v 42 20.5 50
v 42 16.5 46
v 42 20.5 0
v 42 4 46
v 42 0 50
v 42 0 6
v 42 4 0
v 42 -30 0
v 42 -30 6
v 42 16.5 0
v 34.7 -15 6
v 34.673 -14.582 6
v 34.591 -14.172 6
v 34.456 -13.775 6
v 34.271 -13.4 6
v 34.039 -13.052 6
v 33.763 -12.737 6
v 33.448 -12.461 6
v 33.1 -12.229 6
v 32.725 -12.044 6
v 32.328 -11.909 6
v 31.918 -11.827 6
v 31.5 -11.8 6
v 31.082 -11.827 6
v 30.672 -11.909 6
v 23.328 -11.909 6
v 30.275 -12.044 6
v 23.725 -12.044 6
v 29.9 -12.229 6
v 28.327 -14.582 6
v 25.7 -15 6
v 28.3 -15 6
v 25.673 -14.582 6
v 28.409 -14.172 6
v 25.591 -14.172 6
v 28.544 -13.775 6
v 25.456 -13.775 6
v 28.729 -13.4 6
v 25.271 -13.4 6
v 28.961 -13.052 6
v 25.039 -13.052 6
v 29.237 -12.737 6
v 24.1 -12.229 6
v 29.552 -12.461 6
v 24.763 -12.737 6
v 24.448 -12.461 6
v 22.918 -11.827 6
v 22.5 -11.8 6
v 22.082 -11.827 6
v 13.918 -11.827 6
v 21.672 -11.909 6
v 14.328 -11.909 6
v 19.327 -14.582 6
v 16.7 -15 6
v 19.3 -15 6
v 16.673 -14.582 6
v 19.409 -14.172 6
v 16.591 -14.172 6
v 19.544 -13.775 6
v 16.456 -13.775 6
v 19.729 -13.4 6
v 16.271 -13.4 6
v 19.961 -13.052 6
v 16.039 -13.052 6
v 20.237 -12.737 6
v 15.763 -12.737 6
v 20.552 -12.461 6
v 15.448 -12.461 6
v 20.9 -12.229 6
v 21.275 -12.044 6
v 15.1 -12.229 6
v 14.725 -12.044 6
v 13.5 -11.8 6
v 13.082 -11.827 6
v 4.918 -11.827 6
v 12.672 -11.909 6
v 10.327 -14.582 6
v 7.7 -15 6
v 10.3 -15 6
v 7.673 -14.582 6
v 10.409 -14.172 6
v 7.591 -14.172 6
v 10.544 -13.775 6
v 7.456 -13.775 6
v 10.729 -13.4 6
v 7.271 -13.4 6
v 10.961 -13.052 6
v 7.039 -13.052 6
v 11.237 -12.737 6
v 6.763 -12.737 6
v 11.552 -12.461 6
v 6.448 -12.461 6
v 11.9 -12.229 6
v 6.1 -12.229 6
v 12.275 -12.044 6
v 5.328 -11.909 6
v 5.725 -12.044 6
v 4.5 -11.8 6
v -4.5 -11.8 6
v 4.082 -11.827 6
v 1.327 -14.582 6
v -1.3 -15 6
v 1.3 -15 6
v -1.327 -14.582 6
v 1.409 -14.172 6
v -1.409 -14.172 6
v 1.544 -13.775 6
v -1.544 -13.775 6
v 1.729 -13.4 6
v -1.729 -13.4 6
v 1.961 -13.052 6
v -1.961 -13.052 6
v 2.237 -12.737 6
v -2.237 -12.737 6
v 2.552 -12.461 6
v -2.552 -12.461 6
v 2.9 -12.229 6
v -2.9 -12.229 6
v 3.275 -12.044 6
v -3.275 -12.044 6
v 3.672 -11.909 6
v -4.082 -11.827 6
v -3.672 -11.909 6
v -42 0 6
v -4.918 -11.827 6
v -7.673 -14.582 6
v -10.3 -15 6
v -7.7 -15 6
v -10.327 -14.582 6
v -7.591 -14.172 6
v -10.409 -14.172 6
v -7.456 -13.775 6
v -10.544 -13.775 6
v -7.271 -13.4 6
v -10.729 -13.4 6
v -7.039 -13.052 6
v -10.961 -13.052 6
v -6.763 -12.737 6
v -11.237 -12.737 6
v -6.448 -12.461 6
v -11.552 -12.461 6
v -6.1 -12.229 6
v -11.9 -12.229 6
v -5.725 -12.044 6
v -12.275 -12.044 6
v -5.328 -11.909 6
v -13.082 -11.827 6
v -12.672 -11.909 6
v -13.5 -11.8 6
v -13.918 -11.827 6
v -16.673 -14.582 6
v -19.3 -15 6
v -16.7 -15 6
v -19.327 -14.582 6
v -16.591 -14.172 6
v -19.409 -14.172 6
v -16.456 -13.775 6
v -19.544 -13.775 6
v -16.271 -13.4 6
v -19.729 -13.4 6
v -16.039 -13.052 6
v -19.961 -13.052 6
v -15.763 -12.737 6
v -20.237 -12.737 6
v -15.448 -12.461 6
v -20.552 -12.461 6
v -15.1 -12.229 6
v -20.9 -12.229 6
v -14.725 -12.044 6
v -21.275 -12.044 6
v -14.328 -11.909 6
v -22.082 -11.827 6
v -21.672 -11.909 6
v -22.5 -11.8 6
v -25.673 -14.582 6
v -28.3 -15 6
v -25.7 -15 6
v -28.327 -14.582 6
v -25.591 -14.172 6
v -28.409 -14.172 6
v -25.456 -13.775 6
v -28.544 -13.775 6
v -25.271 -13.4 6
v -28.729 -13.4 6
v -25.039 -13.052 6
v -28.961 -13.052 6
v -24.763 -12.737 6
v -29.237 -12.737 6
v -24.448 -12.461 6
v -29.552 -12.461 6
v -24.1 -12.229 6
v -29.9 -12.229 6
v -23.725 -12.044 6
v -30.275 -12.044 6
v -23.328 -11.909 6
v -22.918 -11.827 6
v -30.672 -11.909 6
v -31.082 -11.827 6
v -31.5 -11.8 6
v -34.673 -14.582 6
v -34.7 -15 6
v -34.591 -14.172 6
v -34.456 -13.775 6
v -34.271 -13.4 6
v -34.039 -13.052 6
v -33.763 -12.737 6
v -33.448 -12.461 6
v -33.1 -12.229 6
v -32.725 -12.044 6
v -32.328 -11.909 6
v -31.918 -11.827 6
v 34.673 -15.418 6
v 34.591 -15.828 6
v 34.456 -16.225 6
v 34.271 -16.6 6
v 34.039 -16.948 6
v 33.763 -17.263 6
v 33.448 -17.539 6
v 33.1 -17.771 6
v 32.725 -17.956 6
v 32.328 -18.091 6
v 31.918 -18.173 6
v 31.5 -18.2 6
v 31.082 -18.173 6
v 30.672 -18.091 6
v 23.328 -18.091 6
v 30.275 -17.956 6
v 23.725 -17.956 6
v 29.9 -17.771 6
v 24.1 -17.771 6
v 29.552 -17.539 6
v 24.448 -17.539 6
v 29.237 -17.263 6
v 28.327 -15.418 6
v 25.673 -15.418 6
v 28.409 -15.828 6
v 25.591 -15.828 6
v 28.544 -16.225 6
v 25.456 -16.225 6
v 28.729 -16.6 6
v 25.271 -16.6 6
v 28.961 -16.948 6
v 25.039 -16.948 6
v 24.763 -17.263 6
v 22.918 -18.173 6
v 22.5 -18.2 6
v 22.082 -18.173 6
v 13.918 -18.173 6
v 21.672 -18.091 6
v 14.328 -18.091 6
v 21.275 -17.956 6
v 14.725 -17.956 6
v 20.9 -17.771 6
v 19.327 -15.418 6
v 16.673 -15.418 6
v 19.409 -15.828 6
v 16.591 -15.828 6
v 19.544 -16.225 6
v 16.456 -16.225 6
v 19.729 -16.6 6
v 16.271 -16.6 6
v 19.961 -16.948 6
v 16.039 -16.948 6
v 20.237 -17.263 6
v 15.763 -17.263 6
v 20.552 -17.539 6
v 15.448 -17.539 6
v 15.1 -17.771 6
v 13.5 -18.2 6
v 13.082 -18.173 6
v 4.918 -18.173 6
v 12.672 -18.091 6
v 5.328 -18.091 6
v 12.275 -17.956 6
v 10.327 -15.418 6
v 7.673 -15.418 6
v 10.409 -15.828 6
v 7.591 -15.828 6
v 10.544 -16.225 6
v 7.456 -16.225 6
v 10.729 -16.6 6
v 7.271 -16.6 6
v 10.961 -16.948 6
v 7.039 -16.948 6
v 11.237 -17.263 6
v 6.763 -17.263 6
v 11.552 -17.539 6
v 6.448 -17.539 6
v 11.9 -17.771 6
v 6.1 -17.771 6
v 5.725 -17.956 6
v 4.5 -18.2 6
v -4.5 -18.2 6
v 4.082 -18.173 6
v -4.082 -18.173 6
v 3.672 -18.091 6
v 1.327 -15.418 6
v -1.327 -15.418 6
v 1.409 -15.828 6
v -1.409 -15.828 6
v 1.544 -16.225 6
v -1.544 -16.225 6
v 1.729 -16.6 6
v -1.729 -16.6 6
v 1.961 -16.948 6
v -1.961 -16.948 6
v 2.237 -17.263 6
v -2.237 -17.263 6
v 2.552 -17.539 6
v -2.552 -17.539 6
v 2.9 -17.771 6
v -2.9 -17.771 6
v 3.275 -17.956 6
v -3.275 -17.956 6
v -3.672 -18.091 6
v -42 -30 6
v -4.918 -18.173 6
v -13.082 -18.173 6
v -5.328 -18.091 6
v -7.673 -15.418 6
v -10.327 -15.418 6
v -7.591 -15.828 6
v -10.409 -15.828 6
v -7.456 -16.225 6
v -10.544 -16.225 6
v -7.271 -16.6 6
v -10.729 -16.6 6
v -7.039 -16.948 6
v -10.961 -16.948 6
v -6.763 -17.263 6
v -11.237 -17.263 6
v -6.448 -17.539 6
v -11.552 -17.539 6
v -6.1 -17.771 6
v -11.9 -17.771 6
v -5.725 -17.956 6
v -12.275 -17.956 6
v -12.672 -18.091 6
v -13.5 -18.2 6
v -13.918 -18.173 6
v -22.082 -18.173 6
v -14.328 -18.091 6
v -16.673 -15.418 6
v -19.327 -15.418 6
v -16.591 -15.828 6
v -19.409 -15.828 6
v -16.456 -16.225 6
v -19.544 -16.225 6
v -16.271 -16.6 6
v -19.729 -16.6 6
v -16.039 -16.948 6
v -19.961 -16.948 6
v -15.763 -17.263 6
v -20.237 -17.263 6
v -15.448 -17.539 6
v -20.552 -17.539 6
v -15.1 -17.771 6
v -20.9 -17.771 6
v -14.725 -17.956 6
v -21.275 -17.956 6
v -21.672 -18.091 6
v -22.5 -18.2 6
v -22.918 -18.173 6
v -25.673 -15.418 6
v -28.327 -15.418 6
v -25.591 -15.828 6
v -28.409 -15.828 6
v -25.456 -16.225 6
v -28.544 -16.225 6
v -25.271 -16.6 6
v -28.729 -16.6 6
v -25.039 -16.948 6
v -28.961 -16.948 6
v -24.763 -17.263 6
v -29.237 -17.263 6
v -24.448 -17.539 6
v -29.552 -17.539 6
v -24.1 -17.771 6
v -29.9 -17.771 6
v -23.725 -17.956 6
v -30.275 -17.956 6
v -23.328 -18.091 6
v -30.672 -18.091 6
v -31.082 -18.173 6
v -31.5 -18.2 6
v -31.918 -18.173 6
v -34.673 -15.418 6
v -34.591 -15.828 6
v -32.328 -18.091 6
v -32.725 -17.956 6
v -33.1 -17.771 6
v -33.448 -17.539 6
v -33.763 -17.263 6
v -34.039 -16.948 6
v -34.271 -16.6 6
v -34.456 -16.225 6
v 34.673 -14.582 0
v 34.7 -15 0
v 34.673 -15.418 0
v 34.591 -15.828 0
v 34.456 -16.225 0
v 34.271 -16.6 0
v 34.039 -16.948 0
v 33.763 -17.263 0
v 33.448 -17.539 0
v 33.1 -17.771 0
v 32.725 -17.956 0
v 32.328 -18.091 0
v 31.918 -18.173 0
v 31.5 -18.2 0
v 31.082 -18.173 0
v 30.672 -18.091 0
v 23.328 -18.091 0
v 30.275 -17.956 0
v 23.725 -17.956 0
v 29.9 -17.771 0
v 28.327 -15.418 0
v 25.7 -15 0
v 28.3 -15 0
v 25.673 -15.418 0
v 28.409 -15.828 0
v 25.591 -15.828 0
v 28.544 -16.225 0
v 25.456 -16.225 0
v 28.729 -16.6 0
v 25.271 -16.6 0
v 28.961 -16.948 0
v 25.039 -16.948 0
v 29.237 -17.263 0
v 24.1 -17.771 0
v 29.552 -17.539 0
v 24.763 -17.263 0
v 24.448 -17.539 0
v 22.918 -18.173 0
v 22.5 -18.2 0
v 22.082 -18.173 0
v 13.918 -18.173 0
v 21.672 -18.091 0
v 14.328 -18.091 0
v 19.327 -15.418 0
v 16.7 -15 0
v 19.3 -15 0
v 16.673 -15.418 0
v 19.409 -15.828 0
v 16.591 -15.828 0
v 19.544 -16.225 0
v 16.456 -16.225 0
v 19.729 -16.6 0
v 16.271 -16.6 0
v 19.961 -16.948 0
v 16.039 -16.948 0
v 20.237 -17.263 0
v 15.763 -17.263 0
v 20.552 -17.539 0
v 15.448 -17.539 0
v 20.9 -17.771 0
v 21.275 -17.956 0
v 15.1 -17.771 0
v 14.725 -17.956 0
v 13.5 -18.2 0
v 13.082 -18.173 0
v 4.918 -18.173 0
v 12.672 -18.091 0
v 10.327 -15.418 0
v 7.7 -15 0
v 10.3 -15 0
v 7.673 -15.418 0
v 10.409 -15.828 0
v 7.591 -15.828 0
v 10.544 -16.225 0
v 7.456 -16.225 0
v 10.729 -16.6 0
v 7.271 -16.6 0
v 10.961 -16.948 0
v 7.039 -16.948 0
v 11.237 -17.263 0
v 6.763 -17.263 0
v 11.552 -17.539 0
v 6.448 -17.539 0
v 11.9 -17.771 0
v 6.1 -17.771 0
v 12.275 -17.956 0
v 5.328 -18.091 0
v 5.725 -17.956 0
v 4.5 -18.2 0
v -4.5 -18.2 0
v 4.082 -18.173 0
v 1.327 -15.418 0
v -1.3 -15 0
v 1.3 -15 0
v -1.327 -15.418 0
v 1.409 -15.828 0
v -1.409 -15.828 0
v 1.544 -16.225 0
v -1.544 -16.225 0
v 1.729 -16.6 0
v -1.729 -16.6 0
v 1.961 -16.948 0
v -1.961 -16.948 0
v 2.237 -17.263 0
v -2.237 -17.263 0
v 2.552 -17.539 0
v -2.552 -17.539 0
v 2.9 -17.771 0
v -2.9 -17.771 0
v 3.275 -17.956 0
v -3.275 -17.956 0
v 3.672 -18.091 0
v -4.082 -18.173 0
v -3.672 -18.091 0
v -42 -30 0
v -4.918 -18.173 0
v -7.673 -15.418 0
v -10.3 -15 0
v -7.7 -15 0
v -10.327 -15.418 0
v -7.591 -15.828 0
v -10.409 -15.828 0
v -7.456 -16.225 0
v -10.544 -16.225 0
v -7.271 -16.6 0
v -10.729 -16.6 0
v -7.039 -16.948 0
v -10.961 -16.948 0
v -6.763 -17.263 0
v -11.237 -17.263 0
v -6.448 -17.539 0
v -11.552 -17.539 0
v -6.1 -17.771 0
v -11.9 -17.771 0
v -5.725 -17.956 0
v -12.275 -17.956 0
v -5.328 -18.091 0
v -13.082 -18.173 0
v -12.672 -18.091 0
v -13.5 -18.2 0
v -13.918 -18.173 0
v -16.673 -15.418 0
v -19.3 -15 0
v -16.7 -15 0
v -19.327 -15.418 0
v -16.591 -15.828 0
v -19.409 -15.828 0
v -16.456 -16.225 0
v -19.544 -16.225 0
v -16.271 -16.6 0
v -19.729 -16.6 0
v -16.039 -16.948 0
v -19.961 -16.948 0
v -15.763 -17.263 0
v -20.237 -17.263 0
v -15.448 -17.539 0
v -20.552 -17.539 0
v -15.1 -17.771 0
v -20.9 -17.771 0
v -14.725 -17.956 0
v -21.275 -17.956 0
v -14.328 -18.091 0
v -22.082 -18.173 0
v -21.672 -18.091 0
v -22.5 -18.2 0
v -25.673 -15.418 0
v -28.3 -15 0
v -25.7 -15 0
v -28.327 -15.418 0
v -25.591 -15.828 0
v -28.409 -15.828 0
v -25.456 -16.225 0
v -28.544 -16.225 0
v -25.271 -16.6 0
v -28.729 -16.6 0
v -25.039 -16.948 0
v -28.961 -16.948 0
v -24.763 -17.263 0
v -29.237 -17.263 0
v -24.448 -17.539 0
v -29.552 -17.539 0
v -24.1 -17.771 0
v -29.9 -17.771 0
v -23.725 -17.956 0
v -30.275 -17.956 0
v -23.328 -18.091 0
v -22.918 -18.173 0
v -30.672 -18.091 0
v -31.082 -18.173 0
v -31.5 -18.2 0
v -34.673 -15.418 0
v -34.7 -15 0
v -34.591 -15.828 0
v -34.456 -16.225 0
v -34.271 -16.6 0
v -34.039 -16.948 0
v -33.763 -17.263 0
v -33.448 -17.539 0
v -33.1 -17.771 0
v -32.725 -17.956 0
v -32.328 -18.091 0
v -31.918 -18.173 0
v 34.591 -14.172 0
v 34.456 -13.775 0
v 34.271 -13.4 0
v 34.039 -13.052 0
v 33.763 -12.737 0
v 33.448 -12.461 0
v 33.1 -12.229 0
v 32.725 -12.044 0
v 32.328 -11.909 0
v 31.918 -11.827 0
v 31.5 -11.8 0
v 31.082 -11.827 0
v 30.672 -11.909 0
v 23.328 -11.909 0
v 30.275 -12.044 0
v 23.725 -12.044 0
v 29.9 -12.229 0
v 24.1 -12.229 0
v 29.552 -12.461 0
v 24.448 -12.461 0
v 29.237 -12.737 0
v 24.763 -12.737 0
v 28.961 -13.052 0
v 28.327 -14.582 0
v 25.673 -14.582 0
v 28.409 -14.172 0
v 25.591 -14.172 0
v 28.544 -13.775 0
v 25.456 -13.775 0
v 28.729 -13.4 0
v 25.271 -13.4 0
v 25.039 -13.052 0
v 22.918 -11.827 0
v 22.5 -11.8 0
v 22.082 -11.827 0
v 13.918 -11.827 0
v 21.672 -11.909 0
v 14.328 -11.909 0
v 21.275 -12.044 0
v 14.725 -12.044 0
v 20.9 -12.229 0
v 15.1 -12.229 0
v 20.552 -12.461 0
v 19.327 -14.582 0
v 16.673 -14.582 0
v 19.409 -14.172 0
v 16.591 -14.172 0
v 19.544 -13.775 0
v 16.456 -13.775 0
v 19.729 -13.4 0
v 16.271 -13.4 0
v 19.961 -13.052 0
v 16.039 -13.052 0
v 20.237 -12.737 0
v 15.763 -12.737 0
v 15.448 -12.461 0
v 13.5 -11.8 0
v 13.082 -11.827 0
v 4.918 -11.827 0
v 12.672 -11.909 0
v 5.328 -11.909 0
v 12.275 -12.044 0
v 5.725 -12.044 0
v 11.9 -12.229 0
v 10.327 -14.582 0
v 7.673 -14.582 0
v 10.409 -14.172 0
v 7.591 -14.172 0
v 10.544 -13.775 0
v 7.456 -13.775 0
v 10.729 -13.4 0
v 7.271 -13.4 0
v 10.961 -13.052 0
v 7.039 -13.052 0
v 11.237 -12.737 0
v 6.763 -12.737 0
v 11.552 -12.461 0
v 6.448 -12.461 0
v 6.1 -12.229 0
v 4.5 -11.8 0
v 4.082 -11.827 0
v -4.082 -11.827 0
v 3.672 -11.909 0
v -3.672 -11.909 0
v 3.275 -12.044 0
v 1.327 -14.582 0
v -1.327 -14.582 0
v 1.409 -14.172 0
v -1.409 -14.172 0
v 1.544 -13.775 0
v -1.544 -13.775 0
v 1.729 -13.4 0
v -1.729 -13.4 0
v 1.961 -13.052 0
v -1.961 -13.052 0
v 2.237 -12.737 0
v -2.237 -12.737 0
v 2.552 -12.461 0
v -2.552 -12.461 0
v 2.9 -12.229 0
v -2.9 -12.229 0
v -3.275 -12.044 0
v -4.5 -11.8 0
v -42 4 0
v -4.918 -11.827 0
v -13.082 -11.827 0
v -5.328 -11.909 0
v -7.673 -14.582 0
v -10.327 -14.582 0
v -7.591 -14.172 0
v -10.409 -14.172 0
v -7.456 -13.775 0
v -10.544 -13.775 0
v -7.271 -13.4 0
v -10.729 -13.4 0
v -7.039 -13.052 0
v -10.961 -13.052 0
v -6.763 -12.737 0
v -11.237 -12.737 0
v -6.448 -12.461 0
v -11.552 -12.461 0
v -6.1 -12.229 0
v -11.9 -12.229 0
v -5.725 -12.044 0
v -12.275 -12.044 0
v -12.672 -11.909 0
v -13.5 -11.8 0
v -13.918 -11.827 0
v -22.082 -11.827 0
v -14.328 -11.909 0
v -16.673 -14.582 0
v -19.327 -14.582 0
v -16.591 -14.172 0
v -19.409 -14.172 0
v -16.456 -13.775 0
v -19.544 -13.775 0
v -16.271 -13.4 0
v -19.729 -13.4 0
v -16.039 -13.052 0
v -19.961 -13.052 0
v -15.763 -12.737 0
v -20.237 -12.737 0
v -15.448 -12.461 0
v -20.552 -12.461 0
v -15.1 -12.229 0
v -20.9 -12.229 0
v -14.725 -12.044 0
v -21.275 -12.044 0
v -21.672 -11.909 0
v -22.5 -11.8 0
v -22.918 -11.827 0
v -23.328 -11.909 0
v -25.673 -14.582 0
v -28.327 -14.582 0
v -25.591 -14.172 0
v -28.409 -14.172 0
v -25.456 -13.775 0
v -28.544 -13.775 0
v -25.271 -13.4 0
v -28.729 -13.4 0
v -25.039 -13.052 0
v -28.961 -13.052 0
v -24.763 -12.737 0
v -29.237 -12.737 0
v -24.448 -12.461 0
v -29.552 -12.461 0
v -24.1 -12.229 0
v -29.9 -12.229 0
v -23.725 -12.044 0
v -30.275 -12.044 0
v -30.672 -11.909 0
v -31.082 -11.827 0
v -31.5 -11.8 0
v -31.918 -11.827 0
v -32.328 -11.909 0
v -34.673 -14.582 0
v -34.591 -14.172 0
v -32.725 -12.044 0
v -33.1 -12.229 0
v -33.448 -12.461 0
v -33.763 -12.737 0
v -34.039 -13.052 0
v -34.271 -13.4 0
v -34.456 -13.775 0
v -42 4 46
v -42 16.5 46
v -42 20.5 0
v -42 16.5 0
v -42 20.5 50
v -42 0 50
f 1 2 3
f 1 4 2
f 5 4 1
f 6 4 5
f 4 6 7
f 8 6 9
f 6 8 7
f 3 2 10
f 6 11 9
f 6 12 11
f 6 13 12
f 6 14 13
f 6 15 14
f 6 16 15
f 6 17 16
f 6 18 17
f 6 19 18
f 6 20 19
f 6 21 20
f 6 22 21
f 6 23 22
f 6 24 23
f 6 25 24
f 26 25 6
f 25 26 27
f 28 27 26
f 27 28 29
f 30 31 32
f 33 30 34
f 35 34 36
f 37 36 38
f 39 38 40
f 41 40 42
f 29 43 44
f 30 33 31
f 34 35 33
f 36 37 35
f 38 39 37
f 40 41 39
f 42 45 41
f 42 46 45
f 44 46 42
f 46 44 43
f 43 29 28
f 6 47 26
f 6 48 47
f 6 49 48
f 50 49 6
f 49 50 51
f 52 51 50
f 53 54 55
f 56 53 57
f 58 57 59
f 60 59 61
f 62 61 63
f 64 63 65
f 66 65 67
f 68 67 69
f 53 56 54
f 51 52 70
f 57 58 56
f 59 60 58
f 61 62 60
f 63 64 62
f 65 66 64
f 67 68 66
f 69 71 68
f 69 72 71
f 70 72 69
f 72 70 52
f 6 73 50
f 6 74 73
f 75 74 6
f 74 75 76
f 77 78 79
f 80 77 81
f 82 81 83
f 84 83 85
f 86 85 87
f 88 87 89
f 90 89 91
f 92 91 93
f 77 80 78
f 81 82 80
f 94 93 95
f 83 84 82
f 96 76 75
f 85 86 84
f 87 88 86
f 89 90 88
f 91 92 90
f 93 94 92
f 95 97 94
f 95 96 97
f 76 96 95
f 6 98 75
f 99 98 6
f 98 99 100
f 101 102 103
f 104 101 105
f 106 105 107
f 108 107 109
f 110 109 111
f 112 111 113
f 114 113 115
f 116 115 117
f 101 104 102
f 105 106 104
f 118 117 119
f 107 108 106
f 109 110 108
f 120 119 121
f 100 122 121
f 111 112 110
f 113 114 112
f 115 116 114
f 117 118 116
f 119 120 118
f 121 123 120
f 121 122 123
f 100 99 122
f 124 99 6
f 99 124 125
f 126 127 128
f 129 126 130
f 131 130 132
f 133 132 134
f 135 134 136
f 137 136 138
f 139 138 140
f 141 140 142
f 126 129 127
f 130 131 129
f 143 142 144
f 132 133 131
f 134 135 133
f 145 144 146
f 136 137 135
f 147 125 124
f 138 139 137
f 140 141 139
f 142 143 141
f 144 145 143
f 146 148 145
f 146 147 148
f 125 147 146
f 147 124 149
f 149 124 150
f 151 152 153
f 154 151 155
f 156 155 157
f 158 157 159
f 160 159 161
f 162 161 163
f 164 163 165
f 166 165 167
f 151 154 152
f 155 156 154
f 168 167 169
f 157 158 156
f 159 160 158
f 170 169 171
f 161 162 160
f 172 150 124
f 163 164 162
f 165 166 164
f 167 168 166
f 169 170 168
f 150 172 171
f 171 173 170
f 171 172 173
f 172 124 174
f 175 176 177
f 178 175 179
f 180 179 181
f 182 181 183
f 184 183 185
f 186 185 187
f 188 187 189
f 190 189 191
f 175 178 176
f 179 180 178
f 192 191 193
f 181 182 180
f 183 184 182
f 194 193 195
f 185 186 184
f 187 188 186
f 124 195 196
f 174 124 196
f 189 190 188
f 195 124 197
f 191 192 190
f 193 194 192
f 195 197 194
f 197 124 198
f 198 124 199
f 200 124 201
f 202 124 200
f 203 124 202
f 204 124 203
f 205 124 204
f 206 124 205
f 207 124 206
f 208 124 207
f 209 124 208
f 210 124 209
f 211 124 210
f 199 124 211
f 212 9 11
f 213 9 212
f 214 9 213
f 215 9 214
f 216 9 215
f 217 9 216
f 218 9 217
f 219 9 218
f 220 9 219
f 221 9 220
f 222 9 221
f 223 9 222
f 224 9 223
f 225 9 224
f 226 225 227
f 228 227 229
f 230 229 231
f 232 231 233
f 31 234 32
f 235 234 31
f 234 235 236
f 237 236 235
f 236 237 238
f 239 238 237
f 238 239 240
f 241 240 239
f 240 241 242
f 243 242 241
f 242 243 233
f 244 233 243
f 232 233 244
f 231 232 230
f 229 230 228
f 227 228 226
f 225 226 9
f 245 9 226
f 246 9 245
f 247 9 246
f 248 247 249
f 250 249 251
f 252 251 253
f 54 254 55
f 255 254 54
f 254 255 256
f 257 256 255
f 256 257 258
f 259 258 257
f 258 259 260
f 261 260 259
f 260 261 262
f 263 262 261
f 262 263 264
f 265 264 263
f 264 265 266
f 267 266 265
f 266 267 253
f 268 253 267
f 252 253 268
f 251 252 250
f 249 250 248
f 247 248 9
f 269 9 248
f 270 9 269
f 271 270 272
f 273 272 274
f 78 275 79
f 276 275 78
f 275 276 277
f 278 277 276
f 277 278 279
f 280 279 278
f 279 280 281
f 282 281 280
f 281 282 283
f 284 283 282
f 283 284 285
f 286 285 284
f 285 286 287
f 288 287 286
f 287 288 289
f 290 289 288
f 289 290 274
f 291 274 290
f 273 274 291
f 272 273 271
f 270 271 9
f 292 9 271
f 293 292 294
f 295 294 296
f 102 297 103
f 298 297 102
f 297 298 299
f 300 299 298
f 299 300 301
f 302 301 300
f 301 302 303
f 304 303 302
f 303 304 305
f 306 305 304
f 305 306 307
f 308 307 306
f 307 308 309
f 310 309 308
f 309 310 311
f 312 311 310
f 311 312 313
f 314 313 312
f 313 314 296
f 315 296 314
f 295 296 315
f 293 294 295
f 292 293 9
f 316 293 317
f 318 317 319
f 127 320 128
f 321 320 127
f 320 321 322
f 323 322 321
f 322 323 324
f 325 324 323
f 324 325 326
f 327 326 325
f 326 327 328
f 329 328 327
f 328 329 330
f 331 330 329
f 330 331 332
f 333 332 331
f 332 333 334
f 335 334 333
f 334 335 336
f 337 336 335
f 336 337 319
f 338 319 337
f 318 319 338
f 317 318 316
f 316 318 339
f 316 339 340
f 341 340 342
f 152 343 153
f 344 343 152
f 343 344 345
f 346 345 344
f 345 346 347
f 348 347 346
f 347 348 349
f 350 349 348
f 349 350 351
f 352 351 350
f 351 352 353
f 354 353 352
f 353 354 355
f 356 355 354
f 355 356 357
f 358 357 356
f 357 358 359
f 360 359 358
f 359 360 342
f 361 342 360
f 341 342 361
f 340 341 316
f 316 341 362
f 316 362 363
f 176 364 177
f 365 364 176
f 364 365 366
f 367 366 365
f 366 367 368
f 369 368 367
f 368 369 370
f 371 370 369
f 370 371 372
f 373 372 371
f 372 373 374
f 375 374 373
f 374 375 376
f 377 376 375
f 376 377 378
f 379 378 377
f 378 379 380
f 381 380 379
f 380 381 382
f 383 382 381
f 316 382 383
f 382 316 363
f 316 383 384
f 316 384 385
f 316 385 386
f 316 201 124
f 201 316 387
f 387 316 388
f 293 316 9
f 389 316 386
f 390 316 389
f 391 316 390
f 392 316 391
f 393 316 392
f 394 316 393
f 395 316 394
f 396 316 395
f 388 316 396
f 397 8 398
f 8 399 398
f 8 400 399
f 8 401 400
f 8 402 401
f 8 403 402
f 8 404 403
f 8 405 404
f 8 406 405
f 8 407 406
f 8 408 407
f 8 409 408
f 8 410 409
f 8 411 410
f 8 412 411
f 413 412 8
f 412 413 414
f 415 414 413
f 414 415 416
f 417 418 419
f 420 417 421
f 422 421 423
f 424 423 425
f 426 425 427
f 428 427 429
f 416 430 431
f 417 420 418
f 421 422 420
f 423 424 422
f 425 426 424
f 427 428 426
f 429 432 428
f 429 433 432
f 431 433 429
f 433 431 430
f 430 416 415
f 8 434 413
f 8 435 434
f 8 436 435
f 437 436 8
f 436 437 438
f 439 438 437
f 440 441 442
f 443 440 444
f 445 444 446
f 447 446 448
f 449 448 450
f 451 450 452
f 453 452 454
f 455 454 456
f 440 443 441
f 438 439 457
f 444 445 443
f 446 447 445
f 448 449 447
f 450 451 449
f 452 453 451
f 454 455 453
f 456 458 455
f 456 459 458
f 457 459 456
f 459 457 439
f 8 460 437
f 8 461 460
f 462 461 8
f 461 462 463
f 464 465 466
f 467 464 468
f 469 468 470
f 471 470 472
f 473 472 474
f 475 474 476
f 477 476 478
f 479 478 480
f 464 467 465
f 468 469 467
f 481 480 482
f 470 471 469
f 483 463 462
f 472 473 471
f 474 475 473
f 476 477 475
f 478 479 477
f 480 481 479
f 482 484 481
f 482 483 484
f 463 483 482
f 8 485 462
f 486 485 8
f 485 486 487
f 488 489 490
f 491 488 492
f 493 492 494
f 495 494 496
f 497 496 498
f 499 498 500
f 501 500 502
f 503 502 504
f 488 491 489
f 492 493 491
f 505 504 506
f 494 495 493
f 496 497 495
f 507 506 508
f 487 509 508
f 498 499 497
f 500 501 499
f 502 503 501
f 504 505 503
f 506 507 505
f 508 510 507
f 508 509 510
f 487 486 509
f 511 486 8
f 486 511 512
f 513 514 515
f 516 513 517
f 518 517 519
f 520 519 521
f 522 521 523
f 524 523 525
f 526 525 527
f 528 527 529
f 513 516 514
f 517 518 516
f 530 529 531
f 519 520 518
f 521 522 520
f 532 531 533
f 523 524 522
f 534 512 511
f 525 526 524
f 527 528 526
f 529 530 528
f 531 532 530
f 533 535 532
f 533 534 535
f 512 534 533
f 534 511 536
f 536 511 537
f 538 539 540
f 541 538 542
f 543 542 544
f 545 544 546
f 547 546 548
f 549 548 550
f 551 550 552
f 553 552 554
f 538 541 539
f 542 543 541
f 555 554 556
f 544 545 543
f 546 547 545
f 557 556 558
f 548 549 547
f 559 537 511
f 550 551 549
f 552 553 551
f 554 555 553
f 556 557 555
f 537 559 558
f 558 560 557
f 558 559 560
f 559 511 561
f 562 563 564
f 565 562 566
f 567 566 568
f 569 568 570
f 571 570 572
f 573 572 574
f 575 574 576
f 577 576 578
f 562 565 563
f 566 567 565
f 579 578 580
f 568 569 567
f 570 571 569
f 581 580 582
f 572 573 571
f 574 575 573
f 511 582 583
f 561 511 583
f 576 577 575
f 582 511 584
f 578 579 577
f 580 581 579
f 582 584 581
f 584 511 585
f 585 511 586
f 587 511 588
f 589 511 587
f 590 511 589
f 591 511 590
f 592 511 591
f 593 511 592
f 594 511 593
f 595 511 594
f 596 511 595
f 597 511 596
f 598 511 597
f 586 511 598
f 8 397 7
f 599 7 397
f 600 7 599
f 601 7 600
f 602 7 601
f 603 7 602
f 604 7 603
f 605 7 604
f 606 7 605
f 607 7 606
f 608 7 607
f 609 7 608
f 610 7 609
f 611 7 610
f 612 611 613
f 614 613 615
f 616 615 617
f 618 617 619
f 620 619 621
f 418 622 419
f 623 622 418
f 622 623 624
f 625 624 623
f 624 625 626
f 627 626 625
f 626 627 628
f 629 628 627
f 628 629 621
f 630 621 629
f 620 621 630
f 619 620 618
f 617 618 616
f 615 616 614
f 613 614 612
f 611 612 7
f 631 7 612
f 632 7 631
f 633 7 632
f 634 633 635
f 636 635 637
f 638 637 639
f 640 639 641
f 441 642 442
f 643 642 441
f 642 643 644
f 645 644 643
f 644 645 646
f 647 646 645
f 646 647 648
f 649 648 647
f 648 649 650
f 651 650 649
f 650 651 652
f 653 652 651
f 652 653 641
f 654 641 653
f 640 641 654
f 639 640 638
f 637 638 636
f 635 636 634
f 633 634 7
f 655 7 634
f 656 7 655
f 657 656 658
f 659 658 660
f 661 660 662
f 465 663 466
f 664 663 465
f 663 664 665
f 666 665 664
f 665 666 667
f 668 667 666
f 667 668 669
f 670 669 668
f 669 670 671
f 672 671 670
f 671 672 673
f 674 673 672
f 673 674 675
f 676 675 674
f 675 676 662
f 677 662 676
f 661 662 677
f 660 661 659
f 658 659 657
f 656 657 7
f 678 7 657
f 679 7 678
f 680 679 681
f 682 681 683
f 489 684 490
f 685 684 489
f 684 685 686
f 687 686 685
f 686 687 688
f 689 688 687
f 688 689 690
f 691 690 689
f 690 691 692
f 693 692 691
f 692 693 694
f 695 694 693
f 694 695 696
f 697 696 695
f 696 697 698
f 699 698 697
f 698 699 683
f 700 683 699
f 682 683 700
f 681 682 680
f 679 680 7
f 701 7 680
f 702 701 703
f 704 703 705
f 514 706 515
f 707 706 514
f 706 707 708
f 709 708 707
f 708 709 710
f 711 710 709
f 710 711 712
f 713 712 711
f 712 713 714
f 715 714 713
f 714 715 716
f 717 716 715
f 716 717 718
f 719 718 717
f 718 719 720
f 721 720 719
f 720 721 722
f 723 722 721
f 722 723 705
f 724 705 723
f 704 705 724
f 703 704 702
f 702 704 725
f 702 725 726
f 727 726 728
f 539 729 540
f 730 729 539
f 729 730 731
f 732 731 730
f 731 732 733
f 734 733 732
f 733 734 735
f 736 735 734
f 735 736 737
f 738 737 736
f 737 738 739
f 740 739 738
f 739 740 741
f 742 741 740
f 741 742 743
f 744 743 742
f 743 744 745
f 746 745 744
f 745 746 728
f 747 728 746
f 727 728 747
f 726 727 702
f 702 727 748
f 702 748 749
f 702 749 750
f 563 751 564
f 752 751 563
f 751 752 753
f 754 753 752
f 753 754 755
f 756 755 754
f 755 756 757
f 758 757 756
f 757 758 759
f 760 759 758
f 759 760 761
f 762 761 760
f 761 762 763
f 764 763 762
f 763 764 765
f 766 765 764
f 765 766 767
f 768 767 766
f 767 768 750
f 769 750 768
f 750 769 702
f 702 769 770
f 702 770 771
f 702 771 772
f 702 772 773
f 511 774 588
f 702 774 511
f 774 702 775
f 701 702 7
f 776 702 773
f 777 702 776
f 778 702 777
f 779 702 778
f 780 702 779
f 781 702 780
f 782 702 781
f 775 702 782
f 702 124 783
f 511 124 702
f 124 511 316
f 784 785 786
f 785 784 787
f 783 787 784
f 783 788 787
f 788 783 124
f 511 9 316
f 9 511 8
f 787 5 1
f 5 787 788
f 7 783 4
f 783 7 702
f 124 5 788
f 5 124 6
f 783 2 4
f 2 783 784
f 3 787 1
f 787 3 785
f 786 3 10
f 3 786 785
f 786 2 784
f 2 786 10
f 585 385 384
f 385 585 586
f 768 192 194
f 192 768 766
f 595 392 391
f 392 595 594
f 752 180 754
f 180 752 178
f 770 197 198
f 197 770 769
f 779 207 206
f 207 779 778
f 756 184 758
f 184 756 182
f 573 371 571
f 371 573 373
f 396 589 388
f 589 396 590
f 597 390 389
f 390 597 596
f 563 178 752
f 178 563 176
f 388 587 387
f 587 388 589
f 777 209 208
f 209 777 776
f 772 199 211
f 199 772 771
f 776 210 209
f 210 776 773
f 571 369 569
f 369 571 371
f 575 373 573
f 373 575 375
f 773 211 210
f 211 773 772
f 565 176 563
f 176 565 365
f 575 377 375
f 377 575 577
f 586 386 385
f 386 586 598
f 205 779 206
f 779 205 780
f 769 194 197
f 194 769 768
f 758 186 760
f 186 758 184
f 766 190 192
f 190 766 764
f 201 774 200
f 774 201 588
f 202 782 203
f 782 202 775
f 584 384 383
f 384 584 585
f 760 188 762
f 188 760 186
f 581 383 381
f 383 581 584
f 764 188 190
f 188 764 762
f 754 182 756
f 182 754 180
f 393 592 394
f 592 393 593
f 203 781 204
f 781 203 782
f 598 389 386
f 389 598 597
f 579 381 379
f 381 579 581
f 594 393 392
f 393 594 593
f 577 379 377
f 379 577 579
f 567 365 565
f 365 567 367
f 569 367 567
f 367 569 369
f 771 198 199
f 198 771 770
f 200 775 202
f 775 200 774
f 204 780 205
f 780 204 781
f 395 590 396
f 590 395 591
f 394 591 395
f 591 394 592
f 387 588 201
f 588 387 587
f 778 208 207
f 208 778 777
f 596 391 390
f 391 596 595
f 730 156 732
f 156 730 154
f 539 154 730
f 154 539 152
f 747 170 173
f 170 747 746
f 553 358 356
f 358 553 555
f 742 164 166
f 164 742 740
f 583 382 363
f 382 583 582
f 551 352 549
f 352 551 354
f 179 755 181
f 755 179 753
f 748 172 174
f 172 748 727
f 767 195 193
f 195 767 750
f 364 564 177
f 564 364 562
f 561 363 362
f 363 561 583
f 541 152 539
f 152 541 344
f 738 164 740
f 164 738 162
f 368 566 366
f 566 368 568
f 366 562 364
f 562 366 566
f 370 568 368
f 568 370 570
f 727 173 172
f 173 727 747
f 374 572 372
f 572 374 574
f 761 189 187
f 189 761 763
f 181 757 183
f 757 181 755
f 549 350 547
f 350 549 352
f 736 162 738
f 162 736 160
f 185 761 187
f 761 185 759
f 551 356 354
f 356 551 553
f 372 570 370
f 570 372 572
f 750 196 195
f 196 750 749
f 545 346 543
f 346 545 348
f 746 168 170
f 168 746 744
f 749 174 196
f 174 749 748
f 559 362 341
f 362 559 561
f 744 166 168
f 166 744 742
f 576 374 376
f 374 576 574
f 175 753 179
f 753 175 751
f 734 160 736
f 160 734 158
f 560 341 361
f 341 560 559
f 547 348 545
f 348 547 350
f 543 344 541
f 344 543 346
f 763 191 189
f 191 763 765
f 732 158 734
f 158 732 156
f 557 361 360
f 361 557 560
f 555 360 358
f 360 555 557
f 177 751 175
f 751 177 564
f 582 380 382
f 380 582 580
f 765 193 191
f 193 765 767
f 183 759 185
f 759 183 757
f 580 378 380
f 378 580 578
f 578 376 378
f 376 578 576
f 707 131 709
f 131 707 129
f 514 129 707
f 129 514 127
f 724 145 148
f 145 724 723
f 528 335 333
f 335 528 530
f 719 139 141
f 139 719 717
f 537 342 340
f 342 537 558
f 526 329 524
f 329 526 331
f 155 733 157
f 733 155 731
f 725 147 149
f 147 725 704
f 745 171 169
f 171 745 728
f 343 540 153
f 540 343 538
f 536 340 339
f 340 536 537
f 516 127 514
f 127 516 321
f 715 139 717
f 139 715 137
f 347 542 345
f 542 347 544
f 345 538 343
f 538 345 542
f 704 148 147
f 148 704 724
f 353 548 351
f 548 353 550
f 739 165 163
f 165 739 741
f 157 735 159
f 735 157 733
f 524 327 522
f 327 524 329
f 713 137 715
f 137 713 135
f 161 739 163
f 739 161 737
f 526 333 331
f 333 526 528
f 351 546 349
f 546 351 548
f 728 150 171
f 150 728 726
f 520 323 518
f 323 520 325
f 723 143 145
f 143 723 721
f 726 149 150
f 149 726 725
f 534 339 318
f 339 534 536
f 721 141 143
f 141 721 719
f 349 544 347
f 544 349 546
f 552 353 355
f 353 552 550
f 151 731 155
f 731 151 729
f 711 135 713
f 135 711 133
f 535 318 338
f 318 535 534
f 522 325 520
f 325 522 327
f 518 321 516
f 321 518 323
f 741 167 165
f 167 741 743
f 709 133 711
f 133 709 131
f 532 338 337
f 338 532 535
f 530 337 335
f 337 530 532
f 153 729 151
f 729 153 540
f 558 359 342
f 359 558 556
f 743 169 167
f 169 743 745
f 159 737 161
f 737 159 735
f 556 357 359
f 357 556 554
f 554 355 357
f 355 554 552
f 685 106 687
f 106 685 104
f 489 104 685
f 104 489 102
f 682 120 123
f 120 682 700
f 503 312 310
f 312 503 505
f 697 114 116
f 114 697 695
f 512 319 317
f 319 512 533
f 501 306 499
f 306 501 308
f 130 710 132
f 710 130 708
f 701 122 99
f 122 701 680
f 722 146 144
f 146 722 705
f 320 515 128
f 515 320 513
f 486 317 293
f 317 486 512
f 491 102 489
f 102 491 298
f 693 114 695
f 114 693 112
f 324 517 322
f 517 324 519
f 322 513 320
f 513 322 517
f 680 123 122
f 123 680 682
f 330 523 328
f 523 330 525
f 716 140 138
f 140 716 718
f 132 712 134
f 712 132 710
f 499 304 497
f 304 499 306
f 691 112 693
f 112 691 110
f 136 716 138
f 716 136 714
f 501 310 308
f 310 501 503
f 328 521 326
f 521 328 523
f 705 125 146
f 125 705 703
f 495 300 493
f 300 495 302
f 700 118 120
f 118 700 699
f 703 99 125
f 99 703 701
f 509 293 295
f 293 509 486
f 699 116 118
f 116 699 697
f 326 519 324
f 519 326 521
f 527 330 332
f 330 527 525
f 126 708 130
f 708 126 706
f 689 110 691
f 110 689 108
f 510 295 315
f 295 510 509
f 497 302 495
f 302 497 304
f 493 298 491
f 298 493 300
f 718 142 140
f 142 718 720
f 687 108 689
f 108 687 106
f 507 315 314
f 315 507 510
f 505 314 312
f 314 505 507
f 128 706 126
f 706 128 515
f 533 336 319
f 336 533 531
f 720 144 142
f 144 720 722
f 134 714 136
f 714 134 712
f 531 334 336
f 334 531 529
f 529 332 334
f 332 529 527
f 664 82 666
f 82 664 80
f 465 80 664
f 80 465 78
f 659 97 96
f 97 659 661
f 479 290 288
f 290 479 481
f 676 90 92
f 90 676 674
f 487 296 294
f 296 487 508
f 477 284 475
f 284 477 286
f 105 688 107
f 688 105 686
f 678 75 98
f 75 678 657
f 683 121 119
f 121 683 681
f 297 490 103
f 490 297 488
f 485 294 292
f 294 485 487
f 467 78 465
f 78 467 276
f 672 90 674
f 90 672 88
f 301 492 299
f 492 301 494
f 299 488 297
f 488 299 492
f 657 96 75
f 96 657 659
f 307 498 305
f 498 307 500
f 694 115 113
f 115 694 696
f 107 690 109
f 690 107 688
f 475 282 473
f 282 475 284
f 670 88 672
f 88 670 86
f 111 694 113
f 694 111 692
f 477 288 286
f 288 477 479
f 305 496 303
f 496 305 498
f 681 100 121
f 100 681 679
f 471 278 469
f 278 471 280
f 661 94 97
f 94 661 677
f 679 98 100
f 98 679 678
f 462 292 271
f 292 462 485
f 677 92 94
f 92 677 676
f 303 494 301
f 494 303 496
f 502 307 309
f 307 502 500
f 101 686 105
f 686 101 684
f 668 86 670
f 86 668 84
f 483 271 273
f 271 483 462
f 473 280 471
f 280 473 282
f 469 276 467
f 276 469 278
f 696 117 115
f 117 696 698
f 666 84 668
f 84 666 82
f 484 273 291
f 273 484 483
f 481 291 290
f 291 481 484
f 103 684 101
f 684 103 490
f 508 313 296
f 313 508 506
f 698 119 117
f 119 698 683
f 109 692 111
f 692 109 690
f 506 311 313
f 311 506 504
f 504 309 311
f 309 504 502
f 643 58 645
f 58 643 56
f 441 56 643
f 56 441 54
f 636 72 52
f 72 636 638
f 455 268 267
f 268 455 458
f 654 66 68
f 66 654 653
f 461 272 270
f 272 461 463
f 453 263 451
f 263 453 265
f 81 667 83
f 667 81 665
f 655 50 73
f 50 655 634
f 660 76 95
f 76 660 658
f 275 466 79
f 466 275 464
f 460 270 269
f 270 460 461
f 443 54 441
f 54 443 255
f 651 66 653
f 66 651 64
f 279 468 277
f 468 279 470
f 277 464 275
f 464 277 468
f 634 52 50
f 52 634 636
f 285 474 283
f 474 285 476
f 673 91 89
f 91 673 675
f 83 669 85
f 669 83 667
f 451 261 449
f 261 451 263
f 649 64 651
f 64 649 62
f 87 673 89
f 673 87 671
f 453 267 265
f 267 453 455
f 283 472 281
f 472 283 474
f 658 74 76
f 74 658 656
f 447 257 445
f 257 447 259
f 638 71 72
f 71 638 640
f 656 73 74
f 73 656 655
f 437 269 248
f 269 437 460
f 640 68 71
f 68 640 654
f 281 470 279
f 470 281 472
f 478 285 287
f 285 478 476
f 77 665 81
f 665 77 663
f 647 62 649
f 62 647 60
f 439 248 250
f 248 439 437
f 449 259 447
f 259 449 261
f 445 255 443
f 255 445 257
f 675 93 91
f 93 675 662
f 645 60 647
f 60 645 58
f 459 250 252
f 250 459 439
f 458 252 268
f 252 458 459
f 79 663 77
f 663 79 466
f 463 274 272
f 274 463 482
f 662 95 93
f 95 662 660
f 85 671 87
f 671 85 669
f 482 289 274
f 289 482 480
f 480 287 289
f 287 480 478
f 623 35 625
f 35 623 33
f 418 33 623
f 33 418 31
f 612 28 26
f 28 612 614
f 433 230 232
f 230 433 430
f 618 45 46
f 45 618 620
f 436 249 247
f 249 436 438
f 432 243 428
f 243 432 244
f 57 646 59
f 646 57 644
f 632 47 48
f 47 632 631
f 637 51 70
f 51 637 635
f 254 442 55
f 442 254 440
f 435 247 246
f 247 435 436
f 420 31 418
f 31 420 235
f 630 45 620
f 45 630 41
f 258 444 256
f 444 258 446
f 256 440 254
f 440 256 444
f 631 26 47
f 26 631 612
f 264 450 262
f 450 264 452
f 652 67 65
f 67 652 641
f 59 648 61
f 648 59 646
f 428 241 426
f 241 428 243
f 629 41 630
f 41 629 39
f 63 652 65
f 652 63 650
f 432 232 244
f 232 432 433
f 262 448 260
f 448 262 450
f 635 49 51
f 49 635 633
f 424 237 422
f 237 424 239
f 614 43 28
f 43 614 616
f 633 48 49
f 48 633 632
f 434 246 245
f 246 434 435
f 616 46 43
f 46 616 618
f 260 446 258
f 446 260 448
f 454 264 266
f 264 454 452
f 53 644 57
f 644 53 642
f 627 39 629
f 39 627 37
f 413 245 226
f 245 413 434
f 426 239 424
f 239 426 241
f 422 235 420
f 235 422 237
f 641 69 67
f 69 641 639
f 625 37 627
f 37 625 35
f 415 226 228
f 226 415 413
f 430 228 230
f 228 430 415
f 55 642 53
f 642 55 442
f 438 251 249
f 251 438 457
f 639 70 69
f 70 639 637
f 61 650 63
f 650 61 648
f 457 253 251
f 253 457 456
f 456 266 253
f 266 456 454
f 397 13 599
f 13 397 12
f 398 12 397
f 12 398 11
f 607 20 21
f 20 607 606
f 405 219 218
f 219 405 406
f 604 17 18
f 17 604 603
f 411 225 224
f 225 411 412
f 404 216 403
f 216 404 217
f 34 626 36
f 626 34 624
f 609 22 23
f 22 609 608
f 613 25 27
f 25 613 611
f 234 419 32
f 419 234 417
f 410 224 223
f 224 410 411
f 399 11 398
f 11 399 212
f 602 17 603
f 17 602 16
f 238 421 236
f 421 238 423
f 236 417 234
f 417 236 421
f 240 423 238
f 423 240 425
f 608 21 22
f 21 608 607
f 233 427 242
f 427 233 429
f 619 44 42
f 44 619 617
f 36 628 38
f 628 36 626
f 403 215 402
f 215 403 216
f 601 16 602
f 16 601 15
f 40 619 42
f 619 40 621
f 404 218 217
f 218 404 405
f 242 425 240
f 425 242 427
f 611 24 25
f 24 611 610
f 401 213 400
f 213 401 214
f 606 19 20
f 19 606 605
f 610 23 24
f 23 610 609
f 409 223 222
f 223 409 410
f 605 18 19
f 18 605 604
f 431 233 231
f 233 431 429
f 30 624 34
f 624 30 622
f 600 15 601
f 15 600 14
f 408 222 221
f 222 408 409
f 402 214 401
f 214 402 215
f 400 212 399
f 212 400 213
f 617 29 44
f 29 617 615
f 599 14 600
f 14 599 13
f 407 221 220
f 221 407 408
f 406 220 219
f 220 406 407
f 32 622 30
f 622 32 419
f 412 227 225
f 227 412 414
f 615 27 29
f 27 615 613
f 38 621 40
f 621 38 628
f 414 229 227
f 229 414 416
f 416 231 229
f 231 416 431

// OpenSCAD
// Holder that hangs one 8-tube PCR strip inside an ice bucket, hooked over its 12 mm wall
// Category: quick fixes. An upside-down U (two legs and a bridge) that fits over the wall, and a
// ledge at the foot of the inner leg with eight tube holes, so the tubes sit down in the ice.
// Print: PLA or PETG, as used (both legs and the ledge on the bed); the bridge spans 12.5 mm.
// SPDX-License-Identifier: CERN-OHL-P-2.0

/* [Hanger] */
length = 84;              // along X, centred
leg_t = 4;
gap = 12.5;               // 12 mm bucket wall + clearance
leg_h = 50;               // both legs from z = 0 to 50
bridge_t = 4;             // bridge from z = 46 to 50
ledge = [30, 6];          // ledge reaches 30 mm toward -Y, 6 mm thick
hole_d = 6.4;
n = 8;
pitch = 9;
hole_y = -15;

/* [Hidden] */
eps = 0.01;
outer_y = leg_t + gap;    // outer leg from y = 16.5 to 20.5

difference() {
    union() {
        translate([-length / 2, -ledge[0], 0]) cube([length, ledge[0] + eps, ledge[1]]);
        translate([-length / 2, 0, 0]) cube([length, leg_t, leg_h]);
        translate([-length / 2, 0, leg_h - bridge_t]) cube([length, outer_y + leg_t, bridge_t]);
        translate([-length / 2, outer_y, 0]) cube([length, leg_t, leg_h]);
    }
    for (i = [0 : n - 1])
        translate([(i - (n - 1) / 2) * pitch, hole_y, -1]) cylinder(d = hole_d, h = ledge[1] + 2, $fn = 48);
}
